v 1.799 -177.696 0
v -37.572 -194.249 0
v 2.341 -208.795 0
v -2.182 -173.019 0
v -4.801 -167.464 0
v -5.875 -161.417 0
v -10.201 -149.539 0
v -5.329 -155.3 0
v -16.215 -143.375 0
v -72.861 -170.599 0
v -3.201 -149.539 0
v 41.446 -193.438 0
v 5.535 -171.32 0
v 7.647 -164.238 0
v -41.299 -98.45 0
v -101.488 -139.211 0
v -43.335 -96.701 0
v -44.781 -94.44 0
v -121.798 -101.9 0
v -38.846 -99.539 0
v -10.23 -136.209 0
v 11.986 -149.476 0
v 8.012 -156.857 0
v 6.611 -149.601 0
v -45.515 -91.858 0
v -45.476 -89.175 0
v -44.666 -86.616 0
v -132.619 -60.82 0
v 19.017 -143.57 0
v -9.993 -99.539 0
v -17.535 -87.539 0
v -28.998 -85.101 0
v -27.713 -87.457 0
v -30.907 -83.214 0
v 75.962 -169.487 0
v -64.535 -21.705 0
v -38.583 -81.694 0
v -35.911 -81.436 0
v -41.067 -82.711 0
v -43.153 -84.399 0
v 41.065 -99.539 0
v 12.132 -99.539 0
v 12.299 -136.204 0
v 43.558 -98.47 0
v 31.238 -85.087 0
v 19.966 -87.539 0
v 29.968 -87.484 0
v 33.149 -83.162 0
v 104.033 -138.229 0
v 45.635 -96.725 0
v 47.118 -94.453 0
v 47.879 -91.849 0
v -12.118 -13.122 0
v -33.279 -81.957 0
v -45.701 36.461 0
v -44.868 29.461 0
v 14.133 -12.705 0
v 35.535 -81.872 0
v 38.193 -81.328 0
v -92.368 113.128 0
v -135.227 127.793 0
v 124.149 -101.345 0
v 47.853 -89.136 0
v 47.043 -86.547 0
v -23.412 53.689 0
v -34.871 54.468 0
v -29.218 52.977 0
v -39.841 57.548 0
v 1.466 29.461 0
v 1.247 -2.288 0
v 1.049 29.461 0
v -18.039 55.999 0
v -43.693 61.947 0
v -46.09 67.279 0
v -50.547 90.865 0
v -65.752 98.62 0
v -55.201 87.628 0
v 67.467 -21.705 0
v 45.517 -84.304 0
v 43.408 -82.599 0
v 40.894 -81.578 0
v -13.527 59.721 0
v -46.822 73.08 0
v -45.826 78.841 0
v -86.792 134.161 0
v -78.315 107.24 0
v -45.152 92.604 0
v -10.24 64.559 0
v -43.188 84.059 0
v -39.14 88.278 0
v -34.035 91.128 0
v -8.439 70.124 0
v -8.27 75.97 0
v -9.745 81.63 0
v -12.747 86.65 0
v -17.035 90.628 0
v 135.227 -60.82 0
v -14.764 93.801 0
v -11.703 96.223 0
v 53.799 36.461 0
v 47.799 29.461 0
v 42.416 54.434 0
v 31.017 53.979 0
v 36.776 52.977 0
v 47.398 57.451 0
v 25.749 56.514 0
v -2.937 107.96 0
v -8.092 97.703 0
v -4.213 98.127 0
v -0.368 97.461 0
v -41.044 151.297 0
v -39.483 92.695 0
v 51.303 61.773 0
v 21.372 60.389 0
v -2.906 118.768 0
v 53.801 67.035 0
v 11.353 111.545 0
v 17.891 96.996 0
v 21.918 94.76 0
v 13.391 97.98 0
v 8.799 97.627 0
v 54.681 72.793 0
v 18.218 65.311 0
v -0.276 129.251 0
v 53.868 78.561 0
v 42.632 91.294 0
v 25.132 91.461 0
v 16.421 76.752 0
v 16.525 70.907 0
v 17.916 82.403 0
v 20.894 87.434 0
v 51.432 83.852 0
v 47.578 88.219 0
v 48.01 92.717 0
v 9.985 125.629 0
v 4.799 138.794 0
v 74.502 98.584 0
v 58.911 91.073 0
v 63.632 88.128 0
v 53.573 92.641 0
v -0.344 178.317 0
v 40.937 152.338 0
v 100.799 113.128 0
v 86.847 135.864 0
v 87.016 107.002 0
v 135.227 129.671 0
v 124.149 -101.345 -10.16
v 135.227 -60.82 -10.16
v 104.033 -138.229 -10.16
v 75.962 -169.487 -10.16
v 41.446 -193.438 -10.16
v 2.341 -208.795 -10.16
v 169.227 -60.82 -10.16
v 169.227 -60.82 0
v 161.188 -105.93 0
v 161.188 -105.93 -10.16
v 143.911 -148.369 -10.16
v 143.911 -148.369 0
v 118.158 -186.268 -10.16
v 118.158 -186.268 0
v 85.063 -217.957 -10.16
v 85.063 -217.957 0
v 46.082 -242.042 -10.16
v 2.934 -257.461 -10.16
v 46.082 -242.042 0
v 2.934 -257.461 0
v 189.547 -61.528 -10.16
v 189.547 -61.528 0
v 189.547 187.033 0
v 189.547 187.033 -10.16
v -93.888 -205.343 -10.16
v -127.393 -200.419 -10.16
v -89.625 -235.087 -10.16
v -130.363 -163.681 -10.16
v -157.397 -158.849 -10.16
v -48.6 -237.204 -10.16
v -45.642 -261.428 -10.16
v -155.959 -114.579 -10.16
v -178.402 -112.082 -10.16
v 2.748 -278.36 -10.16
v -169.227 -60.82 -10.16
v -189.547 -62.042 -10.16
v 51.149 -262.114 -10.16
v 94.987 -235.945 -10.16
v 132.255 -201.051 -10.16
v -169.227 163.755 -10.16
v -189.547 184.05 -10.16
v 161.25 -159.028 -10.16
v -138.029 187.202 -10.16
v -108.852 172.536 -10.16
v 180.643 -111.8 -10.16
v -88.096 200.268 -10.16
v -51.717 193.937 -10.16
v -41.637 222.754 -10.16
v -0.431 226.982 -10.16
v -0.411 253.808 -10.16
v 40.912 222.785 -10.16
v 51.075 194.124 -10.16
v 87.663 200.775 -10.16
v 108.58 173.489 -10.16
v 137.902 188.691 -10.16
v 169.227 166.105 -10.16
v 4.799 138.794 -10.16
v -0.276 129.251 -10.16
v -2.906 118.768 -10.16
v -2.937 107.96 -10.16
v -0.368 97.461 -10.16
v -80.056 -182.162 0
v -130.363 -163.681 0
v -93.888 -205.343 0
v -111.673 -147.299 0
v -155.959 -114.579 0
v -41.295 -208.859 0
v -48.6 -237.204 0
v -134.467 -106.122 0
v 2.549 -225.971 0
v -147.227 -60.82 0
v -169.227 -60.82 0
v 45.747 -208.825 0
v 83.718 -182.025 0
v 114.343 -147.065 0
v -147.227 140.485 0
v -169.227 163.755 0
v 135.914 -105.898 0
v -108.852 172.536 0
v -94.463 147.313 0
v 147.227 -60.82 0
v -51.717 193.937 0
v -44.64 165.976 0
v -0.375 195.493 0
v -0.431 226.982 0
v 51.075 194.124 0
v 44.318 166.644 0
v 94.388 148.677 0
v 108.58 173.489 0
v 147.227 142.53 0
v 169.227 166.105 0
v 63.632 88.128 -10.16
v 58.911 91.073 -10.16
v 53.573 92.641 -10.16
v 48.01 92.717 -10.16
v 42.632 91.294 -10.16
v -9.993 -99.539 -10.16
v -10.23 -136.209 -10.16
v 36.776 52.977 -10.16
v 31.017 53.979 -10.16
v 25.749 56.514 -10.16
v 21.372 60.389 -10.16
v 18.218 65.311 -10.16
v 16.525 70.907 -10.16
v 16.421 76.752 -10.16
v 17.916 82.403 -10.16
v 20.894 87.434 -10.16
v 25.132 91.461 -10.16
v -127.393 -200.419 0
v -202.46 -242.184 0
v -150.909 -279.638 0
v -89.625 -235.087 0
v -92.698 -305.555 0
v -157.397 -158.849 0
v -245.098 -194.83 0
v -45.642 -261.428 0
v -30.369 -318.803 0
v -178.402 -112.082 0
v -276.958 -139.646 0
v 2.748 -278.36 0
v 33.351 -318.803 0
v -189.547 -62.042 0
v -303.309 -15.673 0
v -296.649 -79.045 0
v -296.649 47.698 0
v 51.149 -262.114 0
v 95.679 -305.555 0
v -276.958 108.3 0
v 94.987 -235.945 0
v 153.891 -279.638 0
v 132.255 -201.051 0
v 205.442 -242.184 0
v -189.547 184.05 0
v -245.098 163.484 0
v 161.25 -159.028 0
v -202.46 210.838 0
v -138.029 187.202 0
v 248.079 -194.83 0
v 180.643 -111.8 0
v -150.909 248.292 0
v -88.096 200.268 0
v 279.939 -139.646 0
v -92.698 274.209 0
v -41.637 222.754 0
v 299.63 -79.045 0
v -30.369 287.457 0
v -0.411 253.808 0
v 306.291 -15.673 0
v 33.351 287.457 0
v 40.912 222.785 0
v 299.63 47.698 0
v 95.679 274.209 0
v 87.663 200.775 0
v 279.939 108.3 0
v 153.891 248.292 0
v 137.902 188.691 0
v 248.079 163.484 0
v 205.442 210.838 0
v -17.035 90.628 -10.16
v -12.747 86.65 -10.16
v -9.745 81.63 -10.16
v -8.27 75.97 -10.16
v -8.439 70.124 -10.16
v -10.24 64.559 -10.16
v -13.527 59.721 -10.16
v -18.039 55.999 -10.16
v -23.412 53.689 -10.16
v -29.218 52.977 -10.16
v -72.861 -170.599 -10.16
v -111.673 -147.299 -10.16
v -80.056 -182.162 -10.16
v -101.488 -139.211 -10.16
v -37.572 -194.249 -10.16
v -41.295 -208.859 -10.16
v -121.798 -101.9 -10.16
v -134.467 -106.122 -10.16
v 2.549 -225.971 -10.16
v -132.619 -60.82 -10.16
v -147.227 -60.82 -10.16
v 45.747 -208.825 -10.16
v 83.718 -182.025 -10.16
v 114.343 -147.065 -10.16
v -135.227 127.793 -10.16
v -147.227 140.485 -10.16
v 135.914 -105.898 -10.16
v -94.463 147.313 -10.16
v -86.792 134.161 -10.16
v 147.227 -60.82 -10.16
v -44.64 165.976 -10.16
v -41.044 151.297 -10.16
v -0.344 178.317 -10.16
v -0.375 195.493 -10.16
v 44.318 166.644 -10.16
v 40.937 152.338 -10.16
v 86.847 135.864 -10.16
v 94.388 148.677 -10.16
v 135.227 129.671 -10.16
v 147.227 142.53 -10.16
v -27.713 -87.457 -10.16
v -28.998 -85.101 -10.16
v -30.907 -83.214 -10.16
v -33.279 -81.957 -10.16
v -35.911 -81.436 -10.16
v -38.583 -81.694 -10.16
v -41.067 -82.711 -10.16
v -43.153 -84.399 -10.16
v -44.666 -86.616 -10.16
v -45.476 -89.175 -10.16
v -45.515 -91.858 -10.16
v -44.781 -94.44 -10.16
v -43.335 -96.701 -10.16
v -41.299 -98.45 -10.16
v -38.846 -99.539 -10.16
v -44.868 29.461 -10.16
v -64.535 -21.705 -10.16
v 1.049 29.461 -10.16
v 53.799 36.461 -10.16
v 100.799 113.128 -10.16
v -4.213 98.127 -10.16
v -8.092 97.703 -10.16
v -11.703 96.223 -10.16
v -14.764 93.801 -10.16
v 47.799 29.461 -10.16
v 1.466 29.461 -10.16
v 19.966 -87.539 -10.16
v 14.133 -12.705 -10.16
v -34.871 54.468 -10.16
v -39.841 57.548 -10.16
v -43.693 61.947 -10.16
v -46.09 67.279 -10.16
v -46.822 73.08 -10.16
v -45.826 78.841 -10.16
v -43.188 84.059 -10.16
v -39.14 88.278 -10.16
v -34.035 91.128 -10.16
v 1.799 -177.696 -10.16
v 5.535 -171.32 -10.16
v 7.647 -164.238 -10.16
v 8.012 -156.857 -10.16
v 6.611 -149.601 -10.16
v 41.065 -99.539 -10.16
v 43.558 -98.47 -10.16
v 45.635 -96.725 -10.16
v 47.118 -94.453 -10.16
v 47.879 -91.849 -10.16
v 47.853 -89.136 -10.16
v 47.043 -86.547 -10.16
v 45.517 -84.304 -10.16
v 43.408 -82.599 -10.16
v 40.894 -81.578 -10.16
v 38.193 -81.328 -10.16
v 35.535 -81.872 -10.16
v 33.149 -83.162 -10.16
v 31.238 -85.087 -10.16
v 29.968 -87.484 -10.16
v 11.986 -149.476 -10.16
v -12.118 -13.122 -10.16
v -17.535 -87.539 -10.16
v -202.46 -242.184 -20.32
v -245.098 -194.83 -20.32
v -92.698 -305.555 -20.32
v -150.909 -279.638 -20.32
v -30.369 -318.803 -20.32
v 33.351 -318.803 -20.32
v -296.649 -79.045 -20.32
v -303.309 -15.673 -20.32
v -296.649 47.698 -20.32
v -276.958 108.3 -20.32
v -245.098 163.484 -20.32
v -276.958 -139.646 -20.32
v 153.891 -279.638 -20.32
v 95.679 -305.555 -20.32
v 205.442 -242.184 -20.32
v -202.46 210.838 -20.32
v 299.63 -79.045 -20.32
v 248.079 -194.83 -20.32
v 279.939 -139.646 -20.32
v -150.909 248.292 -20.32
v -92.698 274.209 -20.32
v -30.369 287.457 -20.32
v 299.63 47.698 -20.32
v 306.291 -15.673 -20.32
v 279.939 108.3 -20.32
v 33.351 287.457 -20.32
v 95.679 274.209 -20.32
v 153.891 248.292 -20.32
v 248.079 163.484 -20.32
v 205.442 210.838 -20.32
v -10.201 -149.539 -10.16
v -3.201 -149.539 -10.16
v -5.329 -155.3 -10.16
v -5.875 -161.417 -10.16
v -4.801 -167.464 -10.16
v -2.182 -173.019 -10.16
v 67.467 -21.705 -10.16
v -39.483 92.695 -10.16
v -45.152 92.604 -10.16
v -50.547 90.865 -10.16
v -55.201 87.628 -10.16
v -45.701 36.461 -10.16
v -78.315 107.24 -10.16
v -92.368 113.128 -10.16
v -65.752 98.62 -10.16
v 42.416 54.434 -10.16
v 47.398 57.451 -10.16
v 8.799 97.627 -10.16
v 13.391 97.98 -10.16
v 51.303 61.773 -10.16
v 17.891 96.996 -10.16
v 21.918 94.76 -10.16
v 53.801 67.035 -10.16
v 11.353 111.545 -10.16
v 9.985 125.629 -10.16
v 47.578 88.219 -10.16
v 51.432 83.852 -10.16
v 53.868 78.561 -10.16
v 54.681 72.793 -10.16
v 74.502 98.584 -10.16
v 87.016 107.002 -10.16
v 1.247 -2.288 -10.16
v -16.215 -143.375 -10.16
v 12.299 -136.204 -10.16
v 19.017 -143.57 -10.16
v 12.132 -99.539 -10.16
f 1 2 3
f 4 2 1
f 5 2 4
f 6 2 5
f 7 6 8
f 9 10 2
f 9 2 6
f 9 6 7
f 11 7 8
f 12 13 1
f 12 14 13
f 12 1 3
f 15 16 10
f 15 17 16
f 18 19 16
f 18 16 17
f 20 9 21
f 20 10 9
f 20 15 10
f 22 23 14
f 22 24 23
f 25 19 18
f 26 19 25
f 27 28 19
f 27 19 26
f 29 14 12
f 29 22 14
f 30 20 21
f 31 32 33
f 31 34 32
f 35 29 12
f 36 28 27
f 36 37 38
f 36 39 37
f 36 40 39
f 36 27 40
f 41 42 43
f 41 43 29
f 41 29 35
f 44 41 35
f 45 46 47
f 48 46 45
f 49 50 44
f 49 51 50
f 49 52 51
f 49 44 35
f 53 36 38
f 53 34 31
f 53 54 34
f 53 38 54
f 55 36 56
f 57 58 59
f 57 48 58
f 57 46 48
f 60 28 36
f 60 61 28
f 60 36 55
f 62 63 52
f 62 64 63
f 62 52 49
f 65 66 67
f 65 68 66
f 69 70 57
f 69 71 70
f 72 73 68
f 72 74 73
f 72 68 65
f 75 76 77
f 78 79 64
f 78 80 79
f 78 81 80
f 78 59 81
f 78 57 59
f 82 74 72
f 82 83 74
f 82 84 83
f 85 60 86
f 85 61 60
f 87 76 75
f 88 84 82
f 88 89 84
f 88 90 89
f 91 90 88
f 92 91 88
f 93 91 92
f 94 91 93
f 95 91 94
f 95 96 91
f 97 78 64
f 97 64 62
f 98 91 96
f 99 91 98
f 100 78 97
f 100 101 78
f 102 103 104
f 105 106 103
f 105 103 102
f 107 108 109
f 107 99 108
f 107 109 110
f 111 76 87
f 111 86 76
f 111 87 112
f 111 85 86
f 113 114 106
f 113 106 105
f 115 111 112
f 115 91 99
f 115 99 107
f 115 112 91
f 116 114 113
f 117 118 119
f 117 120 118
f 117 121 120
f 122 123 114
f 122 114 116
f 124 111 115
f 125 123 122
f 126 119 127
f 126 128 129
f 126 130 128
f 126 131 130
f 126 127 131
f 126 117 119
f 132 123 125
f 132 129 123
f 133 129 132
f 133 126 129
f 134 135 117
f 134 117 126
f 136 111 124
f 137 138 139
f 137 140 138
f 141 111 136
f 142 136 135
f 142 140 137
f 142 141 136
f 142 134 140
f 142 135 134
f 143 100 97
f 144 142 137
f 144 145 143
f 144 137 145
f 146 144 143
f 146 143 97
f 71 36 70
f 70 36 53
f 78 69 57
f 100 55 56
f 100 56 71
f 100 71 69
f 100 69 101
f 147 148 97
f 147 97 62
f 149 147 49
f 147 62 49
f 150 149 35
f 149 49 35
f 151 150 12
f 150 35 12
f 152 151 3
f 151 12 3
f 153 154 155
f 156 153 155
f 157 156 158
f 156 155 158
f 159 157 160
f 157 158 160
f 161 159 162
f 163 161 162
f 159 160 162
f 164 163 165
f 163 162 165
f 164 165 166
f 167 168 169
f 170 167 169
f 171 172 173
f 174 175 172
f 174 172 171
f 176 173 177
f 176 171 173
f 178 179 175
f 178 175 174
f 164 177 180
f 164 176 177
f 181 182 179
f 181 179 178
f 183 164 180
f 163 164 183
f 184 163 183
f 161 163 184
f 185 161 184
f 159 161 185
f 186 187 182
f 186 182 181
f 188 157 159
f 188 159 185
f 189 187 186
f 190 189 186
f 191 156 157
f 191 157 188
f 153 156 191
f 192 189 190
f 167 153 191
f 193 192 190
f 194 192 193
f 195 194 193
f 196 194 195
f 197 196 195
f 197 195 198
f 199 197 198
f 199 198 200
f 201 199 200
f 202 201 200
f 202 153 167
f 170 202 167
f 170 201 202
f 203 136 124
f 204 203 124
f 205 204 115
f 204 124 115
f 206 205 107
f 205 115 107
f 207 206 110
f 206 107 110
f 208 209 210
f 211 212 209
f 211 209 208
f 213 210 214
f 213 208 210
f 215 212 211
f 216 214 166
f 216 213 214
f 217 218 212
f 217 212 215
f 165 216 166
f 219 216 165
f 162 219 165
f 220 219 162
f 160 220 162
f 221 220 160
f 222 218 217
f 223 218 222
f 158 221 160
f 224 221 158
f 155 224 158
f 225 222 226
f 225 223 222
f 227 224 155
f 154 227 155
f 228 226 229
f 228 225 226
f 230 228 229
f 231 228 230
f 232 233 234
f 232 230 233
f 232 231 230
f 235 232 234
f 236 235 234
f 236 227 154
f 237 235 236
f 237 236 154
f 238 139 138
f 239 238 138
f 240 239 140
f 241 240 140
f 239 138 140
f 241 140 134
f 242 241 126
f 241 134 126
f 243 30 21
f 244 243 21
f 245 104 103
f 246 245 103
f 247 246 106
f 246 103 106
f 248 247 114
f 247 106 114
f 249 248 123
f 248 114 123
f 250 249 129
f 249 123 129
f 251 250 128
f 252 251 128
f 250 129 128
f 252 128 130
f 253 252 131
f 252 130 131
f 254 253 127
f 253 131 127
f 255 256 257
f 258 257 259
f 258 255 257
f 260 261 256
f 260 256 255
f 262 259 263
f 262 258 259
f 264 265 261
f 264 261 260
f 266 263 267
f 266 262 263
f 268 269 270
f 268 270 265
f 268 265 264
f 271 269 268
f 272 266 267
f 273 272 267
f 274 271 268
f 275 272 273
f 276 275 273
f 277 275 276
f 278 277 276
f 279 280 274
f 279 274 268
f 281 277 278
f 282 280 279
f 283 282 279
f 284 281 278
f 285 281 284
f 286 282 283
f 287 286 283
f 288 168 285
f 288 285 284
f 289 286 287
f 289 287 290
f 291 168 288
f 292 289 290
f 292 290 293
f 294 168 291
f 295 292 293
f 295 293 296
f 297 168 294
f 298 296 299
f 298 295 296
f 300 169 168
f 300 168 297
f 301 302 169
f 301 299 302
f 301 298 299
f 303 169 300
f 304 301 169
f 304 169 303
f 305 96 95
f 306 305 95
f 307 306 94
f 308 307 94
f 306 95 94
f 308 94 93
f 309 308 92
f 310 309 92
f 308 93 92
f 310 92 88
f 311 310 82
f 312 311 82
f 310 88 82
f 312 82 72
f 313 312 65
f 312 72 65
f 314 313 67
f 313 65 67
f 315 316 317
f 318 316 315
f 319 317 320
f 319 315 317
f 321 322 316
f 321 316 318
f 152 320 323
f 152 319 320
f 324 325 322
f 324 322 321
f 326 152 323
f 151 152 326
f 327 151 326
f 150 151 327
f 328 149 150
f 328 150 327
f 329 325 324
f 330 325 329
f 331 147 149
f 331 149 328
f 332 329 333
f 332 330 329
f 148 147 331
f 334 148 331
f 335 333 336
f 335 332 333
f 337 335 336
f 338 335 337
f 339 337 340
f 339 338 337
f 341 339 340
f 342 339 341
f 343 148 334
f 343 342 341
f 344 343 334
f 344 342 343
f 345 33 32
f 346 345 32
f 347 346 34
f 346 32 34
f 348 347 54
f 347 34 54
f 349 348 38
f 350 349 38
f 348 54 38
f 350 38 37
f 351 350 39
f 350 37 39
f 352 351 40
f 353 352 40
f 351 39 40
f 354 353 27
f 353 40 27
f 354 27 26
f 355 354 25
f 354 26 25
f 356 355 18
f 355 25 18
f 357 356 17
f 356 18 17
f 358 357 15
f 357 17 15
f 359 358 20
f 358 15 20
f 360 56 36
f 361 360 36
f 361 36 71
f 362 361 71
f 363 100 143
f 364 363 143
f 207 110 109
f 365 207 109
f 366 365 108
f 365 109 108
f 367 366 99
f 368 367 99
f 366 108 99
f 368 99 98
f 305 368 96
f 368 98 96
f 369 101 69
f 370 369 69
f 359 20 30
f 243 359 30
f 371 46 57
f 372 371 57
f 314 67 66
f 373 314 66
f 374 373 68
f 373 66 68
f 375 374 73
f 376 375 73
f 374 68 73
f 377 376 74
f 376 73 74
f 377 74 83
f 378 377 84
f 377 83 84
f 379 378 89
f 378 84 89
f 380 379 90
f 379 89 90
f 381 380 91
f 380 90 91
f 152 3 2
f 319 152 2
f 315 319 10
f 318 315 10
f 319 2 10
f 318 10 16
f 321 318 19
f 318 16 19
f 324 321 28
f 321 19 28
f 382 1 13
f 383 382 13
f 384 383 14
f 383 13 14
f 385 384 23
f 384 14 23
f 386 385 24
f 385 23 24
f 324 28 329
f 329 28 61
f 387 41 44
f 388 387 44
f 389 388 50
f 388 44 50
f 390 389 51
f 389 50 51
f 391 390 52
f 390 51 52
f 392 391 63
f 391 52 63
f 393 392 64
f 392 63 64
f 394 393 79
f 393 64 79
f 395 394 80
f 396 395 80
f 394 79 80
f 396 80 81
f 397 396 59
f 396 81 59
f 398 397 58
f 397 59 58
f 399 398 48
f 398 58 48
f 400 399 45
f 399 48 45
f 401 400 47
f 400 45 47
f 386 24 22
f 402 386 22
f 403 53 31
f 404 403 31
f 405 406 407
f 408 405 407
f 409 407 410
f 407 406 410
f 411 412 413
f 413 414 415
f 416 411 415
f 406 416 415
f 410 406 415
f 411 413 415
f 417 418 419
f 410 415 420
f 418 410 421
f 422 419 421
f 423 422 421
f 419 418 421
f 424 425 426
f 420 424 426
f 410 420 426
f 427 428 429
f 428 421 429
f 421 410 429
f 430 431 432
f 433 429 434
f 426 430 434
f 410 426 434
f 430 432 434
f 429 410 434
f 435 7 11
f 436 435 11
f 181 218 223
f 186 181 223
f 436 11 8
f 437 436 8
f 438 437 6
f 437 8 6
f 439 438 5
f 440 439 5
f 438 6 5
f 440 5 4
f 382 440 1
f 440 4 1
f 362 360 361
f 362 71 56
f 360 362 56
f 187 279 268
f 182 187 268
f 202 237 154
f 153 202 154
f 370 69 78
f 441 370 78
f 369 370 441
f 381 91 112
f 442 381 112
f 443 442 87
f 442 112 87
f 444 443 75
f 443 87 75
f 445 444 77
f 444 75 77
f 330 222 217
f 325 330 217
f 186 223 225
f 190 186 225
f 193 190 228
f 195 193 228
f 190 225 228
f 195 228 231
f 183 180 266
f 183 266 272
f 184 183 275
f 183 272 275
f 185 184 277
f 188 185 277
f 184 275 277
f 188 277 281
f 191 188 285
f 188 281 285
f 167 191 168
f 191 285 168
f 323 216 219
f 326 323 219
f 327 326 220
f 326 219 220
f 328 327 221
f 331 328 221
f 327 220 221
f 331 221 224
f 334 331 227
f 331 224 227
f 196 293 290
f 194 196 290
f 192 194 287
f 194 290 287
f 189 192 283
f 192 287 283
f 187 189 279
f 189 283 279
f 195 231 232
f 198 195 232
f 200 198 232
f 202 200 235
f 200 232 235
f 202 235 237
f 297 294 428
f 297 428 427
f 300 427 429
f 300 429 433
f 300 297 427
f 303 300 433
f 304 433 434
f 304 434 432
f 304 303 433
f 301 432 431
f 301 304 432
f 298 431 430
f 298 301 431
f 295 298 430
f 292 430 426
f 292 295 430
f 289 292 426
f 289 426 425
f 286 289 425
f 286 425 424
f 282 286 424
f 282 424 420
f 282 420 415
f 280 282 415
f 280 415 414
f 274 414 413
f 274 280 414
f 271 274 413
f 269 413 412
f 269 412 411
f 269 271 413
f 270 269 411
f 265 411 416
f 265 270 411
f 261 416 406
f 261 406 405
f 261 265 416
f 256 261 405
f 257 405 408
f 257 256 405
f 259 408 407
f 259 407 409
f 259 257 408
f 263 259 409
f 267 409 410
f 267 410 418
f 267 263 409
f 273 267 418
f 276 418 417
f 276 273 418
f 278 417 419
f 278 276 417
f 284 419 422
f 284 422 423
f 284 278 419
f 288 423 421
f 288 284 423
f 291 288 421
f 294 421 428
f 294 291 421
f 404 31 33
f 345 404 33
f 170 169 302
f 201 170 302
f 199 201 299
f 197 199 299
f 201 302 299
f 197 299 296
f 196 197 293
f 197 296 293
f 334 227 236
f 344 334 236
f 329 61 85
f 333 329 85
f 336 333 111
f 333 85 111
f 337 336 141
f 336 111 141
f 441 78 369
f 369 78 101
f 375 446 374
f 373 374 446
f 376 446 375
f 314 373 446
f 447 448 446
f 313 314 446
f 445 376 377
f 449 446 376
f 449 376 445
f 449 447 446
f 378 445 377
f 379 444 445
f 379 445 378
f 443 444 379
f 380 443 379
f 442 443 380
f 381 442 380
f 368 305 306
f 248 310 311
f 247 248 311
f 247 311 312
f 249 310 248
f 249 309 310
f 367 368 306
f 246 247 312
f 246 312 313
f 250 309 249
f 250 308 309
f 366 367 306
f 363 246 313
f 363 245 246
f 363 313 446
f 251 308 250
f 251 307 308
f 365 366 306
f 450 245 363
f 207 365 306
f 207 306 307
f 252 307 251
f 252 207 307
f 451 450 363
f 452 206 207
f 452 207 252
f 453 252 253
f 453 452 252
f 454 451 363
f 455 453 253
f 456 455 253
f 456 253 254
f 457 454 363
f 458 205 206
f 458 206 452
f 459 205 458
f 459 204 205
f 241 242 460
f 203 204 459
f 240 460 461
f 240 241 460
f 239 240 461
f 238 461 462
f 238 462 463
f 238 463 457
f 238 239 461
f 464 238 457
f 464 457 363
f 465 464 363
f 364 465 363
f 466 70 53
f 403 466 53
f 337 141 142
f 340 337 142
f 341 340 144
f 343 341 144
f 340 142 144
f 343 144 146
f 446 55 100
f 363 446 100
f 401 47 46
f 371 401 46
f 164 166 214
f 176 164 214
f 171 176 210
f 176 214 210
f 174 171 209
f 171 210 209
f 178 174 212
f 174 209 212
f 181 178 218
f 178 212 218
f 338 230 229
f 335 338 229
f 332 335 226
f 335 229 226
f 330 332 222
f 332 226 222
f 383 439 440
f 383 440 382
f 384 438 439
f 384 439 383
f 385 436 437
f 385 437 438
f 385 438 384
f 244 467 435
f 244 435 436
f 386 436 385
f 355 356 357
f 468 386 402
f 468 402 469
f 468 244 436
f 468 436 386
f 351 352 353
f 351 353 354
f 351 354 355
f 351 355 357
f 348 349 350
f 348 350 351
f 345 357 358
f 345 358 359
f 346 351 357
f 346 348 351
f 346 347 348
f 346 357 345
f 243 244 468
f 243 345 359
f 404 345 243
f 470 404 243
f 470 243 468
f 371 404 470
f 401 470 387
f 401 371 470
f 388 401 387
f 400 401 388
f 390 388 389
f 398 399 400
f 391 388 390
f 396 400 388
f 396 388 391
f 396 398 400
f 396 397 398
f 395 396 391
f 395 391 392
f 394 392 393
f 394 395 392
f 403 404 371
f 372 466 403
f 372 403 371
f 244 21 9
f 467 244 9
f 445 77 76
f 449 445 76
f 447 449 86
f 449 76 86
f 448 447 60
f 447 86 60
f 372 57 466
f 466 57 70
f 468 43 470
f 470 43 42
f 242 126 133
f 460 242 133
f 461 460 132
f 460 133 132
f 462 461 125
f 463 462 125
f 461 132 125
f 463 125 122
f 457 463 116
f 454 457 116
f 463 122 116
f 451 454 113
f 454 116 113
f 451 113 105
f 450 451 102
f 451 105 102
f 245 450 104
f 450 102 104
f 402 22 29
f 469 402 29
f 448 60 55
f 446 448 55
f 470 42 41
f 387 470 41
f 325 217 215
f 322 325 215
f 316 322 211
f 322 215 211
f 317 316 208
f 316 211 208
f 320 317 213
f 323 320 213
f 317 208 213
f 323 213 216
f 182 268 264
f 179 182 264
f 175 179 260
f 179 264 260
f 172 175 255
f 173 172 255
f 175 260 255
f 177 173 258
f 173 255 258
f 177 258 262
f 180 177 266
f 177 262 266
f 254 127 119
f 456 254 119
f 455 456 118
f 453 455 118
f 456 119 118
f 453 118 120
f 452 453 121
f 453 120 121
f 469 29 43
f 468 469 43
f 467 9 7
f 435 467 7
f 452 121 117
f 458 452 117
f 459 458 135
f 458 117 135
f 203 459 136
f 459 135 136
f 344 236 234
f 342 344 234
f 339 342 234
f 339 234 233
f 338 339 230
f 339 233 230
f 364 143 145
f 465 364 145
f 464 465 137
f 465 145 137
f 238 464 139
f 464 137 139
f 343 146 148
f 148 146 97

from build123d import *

# Parameters (mm, degrees)
F2_DEPTH  = 31.75
F4_DEPTH  = 11.43
F6_DEPTH  = 8.89
F8_DEPTH  = 8.89
F10_DEPTH = 8.89
F12_DEPTH = 8.89
F13_R     = 304.8
F14_DEPTH = 20.32
F16_DEPTH = 10.16
F18_DEPTH = 10.16
F20_DEPTH = 10.16
F22_DEPTH = 10.16
F24_DEPTH = 10.16
F26_DEPTH = 10.16
F27_R     = 304.8
F28_DEPTH = 38.1


with BuildPart() as f2:
    # F1 (on Top) → F2 (new body)
    with BuildSketch(Plane.XY):
        with BuildLine():
            ThreePointArc((-0.430908, 226.982415), (-79.711548, 181.706479), (-169.227302, 163.75488))
            Line((-169.227302, 163.75488), (-169.227302, -60.819823))
            ThreePointArc((-169.227302, -60.819823), (-113.369381, -185.600772), (2.933838, -257.461429))
            ThreePointArc((2.933838, -257.461429), (118.158195, -186.267639), (169.227302, -60.819823))
            Line((169.227302, -60.819823), (169.227302, 166.105464))
            ThreePointArc((169.227302, 166.105464), (79.251051, 182.199338), (-0.430908, 226.982415))
        make_face()
    extrude(amount=F2_DEPTH)

    # F3 (on face) → F4 (cut)
    with BuildSketch(Plane.XY.offset(31.75)):
        with BuildLine():
            ThreePointArc((-0.374756, 195.493162), (-69.015087, 155.212384), (-147.227302, 140.485346))
            Line((-147.227302, 140.485346), (-147.227302, -60.819823))
            ThreePointArc((-147.227302, -60.819823), (-96.87236, -165.644499), (2.548859, -225.97073))
            ThreePointArc((2.548859, -225.97073), (100.066402, -165.452439), (147.227302, -60.819823))
            Line((147.227302, -60.819823), (147.227302, 142.530277))
            ThreePointArc((147.227302, 142.530277), (68.839046, 156.227594), (-0.374756, 195.493162))
        make_face()
        with BuildLine():
            Line((-132.618561, -60.819823), (-135.227293, 127.792969))
            ThreePointArc((-135.227293, 127.792969), (-63.429471, 141.425292), (-0.343994, 178.316891))
            ThreePointArc((-0.343994, 178.316891), (63.444172, 142.853346), (135.227293, 129.670903))
            Line((135.227293, 129.670903), (135.227293, -60.819823))
            ThreePointArc((135.227293, -60.819823), (90.906741, -154.674215), (2.340942, -208.794981))
            ThreePointArc((2.340942, -208.794981), (-88.121088, -155.768197), (-132.618561, -60.819823))
        make_face(mode=Mode.SUBTRACT)
    extrude(amount=-F4_DEPTH, mode=Mode.SUBTRACT)

    # F5 (on face) → F6 (cut)
    with BuildSketch(Plane.XY.offset(31.75)):
        with BuildLine():
            Line((-92.367917, 113.127932), (-45.701414, 36.461424))
            Line((-45.701414, 36.461424), (53.798582, 36.461424))
            Line((53.798582, 36.461424), (100.798585, 113.127932))
            ThreePointArc((100.798585, 113.127932), (80.575922, 103.064845), (63.631594, 88.127926))
            ThreePointArc((63.631594, 88.127926), (53.573391, 92.641146), (42.631593, 91.29443))
            ThreePointArc((42.631593, 91.29443), (54.451081, 69.882064), (36.776334, 52.976649))
            ThreePointArc((36.776334, 52.976649), (17.177594, 68.050279), (25.131593, 91.460936))
            ThreePointArc((25.131593, 91.460936), (17.890886, 96.996315), (8.798584, 97.627439))
            ThreePointArc((8.798584, 97.627439), (11.159805, 118.634697), (4.798584, 138.794437))
            ThreePointArc((4.798584, 138.794437), (-2.905563, 118.768028), (-0.36792, 97.461425))
            ThreePointArc((-0.36792, 97.461425), (-9.949798, 97.0895), (-17.034912, 90.627931))
            ThreePointArc((-17.034912, 90.627931), (-9.141713, 67.277349), (-29.217625, 52.976649))
            ThreePointArc((-29.217625, 52.976649), (-46.671559, 70.152552), (-34.034912, 91.127932))
            ThreePointArc((-34.034912, 91.127932), (-45.151665, 92.60432), (-55.201415, 87.627932))
            ThreePointArc((-55.201415, 87.627932), (-71.812791, 103.251959), (-92.367917, 113.127932))
        make_face()
    extrude(amount=-F6_DEPTH, mode=Mode.SUBTRACT)

    # F7 (on face) → F8 (cut)
    with BuildSketch(Plane.XY.offset(31.75)):
        Polygon((1.882065, 29.461427), (67.46655, -21.70459), (47.798585, 29.461427), align=None)
    extrude(amount=-F8_DEPTH, mode=Mode.SUBTRACT)

    # F9 (on face) → F10 (cut)
    with BuildSketch(Plane.XY.offset(31.75)):
        Polygon((1.048598, 29.461427), (-44.867922, 29.461427), (-64.53491, -21.70459), align=None)
    extrude(amount=-F10_DEPTH, mode=Mode.SUBTRACT)

    # F11 (on face) → F12 (cut)
    with BuildSketch(Plane.XY.offset(31.75)):
        with BuildLine():
            Line((1.246826, -2.287598), (-12.11792, -13.121582))
            Line((-12.11792, -13.121582), (-17.534912, -87.538578))
            Line((-17.534912, -87.538578), (-27.712647, -87.456539))
            ThreePointArc((-27.712647, -87.456539), (-43.153284, -84.398915), (-38.845949, -99.538572))
            Line((-38.845949, -99.538572), (-9.99292, -99.538572))
            Line((-9.99292, -99.538572), (-10.230225, -136.209473))
            Line((-10.230225, -136.209473), (-16.215088, -143.374518))
            Line((-16.215088, -143.374518), (-10.201416, -149.538577))
            Line((-10.201416, -149.538577), (-3.201416, -149.538577))
            ThreePointArc((-3.201416, -149.538577), (-5.538014, -164.476042), (1.798584, -177.695796))
            ThreePointArc((1.798584, -177.695796), (7.646569, -164.237988), (6.611084, -149.601072))
            Line((6.611084, -149.601072), (11.986084, -149.476081))
            Line((11.986084, -149.476081), (19.017333, -143.569827))
            Line((19.017333, -143.569827), (12.298584, -136.203617))
            Line((12.298584, -136.203617), (12.131592, -99.538572))
            Line((12.131592, -99.538572), (41.065186, -99.538572))
            ThreePointArc((41.065186, -99.538572), (45.517328, -84.304241), (29.96753, -87.48389))
            Line((29.96753, -87.48389), (19.965576, -87.538578))
            Line((19.965576, -87.538578), (14.132569, -12.705078))
            Line((14.132569, -12.705078), (1.246826, -2.287598))
        make_face()
    extrude(amount=-F12_DEPTH, mode=Mode.SUBTRACT)

    # F13 (on face) → F14 (join)
    with BuildSketch(Plane.XY):
        with Locations((1.490798, -15.673031)):
            Circle(F13_R)
    extrude(amount=-F14_DEPTH)

    # F15 (on face) → F16 (cut)
    with BuildSketch(Plane.XY):
        with BuildLine():
            Line((-189.547302, 184.049582), (-189.547302, -62.041552))
            ThreePointArc((-189.547302, -62.041552), (-127.393416, -200.419297), (2.747771, -278.360156))
            ThreePointArc((2.747771, -278.360156), (132.255423, -201.050673), (189.547302, -61.527812))
            Line((189.547302, -61.527812), (189.547302, 187.032623))
            ThreePointArc((189.547302, 187.032623), (87.662532, 200.775305), (-0.410603, 253.808226))
            ThreePointArc((-0.410603, 253.808226), (-88.09635, 200.268094), (-189.547302, 184.049582))
        make_face()
        with BuildLine():
            Line((-169.227302, -60.819823), (-169.227302, 163.75488))
            ThreePointArc((-169.227302, 163.75488), (-79.711548, 181.706479), (-0.430908, 226.982415))
            ThreePointArc((-0.430908, 226.982415), (79.251051, 182.199338), (169.227302, 166.105464))
            Line((169.227302, 166.105464), (169.227302, -60.819823))
            ThreePointArc((169.227302, -60.819823), (118.158195, -186.267639), (2.933838, -257.461429))
            ThreePointArc((2.933838, -257.461429), (-113.369381, -185.600772), (-169.227302, -60.819823))
        make_face(mode=Mode.SUBTRACT)
    extrude(amount=-F16_DEPTH, mode=Mode.SUBTRACT)

    # F17 (on face) → F18 (cut)
    with BuildSketch(Plane.XY):
        with BuildLine():
            ThreePointArc((-0.374756, 195.493162), (-69.015087, 155.212384), (-147.227302, 140.485346))
            Line((-147.227302, 140.485346), (-147.227302, -60.819823))
            ThreePointArc((-147.227302, -60.819823), (-96.87236, -165.644499), (2.548859, -225.97073))
            ThreePointArc((2.548859, -225.97073), (100.066402, -165.452439), (147.227302, -60.819823))
            Line((147.227302, -60.819823), (147.227302, 142.530277))
            ThreePointArc((147.227302, 142.530277), (68.839046, 156.227594), (-0.374756, 195.493162))
        make_face()
        with BuildLine():
            Line((-132.618561, -60.819823), (-135.227293, 127.792969))
            ThreePointArc((-135.227293, 127.792969), (-63.429471, 141.425292), (-0.343994, 178.316891))
            ThreePointArc((-0.343994, 178.316891), (63.444172, 142.853346), (135.227293, 129.670903))
            Line((135.227293, 129.670903), (135.227293, -60.819823))
            ThreePointArc((135.227293, -60.819823), (90.906741, -154.674215), (2.340942, -208.794981))
            ThreePointArc((2.340942, -208.794981), (-88.121088, -155.768197), (-132.618561, -60.819823))
        make_face(mode=Mode.SUBTRACT)
    extrude(amount=-F18_DEPTH, mode=Mode.SUBTRACT)

    # F19 (on face) → F20 (cut)
    with BuildSketch(Plane.XY):
        with BuildLine():
            Line((19.965576, -87.538578), (14.132569, -12.705078))
            Line((14.132569, -12.705078), (1.246826, -2.287598))
            Line((1.246826, -2.287598), (-12.11792, -13.121582))
            Line((-12.11792, -13.121582), (-17.534912, -87.538578))
            Line((-17.534912, -87.538578), (-27.712647, -87.456539))
            ThreePointArc((-27.712647, -87.456539), (-43.153284, -84.398915), (-38.845949, -99.538572))
            Line((-38.845949, -99.538572), (-9.99292, -99.538572))
            Line((-9.99292, -99.538572), (-10.230225, -136.209473))
            Line((-10.230225, -136.209473), (-16.215088, -143.374518))
            Line((-16.215088, -143.374518), (-10.201416, -149.538577))
            Line((-10.201416, -149.538577), (-3.201416, -149.538577))
            ThreePointArc((-3.201416, -149.538577), (-5.538014, -164.476042), (1.798584, -177.695796))
            ThreePointArc((1.798584, -177.695796), (7.646569, -164.237988), (6.611084, -149.601072))
            Line((6.611084, -149.601072), (11.986084, -149.476081))
            Line((11.986084, -149.476081), (19.017333, -143.569827))
            Line((19.017333, -143.569827), (12.298584, -136.203617))
            Line((12.298584, -136.203617), (12.131592, -99.538572))
            Line((12.131592, -99.538572), (41.065186, -99.538572))
            ThreePointArc((41.065186, -99.538572), (45.517328, -84.304241), (29.96753, -87.48389))
            Line((29.96753, -87.48389), (19.965576, -87.538578))
        make_face()
    extrude(amount=-F20_DEPTH, mode=Mode.SUBTRACT)

    # F21 (on face) → F22 (cut)
    with BuildSketch(Plane.XY):
        Polygon((1.048598, 29.461427), (-44.867922, 29.461427), (-64.53491, -21.70459), align=None)
    extrude(amount=-F22_DEPTH, mode=Mode.SUBTRACT)

    # F23 (on face) → F24 (cut)
    with BuildSketch(Plane.XY):
        Polygon((47.798585, 29.461427), (1.465576, 29.461427), (67.46655, -21.70459), align=None)
    extrude(amount=-F24_DEPTH, mode=Mode.SUBTRACT)

    # F25 (on face) → F26 (cut)
    with BuildSketch(Plane.XY):
        with BuildLine():
            ThreePointArc((-34.034912, 91.127932), (-45.151665, 92.60432), (-55.201415, 87.627932))
            ThreePointArc((-55.201415, 87.627932), (-71.812791, 103.251959), (-92.367917, 113.127932))
            Line((-92.367917, 113.127932), (-45.701414, 36.461424))
            Line((-45.701414, 36.461424), (53.798582, 36.461424))
            Line((53.798582, 36.461424), (100.798585, 113.127932))
            ThreePointArc((100.798585, 113.127932), (80.575922, 103.064845), (63.631594, 88.127926))
            ThreePointArc((63.631594, 88.127926), (53.573391, 92.641146), (42.631593, 91.29443))
            ThreePointArc((42.631593, 91.29443), (54.451081, 69.882064), (36.776334, 52.976649))
            ThreePointArc((36.776334, 52.976649), (17.177594, 68.050279), (25.131593, 91.460936))
            ThreePointArc((25.131593, 91.460936), (17.890886, 96.996315), (8.798584, 97.627439))
            ThreePointArc((8.798584, 97.627439), (11.159805, 118.634697), (4.798584, 138.794437))
            ThreePointArc((4.798584, 138.794437), (-2.905563, 118.768028), (-0.36792, 97.461425))
            ThreePointArc((-0.36792, 97.461425), (-9.949798, 97.0895), (-17.034912, 90.627931))
            ThreePointArc((-17.034912, 90.627931), (-9.141713, 67.277349), (-29.217625, 52.976649))
            ThreePointArc((-29.217625, 52.976649), (-46.671559, 70.152552), (-34.034912, 91.127932))
        make_face()
    extrude(amount=-F26_DEPTH, mode=Mode.SUBTRACT)

    # F27 (on face) → F28 (cut)
    with BuildSketch(Plane.XY):
        with Locations((1.490798, -15.673031)):
            Circle(F27_R)
    extrude(amount=F28_DEPTH, mode=Mode.SUBTRACT)


solid = f2.part
